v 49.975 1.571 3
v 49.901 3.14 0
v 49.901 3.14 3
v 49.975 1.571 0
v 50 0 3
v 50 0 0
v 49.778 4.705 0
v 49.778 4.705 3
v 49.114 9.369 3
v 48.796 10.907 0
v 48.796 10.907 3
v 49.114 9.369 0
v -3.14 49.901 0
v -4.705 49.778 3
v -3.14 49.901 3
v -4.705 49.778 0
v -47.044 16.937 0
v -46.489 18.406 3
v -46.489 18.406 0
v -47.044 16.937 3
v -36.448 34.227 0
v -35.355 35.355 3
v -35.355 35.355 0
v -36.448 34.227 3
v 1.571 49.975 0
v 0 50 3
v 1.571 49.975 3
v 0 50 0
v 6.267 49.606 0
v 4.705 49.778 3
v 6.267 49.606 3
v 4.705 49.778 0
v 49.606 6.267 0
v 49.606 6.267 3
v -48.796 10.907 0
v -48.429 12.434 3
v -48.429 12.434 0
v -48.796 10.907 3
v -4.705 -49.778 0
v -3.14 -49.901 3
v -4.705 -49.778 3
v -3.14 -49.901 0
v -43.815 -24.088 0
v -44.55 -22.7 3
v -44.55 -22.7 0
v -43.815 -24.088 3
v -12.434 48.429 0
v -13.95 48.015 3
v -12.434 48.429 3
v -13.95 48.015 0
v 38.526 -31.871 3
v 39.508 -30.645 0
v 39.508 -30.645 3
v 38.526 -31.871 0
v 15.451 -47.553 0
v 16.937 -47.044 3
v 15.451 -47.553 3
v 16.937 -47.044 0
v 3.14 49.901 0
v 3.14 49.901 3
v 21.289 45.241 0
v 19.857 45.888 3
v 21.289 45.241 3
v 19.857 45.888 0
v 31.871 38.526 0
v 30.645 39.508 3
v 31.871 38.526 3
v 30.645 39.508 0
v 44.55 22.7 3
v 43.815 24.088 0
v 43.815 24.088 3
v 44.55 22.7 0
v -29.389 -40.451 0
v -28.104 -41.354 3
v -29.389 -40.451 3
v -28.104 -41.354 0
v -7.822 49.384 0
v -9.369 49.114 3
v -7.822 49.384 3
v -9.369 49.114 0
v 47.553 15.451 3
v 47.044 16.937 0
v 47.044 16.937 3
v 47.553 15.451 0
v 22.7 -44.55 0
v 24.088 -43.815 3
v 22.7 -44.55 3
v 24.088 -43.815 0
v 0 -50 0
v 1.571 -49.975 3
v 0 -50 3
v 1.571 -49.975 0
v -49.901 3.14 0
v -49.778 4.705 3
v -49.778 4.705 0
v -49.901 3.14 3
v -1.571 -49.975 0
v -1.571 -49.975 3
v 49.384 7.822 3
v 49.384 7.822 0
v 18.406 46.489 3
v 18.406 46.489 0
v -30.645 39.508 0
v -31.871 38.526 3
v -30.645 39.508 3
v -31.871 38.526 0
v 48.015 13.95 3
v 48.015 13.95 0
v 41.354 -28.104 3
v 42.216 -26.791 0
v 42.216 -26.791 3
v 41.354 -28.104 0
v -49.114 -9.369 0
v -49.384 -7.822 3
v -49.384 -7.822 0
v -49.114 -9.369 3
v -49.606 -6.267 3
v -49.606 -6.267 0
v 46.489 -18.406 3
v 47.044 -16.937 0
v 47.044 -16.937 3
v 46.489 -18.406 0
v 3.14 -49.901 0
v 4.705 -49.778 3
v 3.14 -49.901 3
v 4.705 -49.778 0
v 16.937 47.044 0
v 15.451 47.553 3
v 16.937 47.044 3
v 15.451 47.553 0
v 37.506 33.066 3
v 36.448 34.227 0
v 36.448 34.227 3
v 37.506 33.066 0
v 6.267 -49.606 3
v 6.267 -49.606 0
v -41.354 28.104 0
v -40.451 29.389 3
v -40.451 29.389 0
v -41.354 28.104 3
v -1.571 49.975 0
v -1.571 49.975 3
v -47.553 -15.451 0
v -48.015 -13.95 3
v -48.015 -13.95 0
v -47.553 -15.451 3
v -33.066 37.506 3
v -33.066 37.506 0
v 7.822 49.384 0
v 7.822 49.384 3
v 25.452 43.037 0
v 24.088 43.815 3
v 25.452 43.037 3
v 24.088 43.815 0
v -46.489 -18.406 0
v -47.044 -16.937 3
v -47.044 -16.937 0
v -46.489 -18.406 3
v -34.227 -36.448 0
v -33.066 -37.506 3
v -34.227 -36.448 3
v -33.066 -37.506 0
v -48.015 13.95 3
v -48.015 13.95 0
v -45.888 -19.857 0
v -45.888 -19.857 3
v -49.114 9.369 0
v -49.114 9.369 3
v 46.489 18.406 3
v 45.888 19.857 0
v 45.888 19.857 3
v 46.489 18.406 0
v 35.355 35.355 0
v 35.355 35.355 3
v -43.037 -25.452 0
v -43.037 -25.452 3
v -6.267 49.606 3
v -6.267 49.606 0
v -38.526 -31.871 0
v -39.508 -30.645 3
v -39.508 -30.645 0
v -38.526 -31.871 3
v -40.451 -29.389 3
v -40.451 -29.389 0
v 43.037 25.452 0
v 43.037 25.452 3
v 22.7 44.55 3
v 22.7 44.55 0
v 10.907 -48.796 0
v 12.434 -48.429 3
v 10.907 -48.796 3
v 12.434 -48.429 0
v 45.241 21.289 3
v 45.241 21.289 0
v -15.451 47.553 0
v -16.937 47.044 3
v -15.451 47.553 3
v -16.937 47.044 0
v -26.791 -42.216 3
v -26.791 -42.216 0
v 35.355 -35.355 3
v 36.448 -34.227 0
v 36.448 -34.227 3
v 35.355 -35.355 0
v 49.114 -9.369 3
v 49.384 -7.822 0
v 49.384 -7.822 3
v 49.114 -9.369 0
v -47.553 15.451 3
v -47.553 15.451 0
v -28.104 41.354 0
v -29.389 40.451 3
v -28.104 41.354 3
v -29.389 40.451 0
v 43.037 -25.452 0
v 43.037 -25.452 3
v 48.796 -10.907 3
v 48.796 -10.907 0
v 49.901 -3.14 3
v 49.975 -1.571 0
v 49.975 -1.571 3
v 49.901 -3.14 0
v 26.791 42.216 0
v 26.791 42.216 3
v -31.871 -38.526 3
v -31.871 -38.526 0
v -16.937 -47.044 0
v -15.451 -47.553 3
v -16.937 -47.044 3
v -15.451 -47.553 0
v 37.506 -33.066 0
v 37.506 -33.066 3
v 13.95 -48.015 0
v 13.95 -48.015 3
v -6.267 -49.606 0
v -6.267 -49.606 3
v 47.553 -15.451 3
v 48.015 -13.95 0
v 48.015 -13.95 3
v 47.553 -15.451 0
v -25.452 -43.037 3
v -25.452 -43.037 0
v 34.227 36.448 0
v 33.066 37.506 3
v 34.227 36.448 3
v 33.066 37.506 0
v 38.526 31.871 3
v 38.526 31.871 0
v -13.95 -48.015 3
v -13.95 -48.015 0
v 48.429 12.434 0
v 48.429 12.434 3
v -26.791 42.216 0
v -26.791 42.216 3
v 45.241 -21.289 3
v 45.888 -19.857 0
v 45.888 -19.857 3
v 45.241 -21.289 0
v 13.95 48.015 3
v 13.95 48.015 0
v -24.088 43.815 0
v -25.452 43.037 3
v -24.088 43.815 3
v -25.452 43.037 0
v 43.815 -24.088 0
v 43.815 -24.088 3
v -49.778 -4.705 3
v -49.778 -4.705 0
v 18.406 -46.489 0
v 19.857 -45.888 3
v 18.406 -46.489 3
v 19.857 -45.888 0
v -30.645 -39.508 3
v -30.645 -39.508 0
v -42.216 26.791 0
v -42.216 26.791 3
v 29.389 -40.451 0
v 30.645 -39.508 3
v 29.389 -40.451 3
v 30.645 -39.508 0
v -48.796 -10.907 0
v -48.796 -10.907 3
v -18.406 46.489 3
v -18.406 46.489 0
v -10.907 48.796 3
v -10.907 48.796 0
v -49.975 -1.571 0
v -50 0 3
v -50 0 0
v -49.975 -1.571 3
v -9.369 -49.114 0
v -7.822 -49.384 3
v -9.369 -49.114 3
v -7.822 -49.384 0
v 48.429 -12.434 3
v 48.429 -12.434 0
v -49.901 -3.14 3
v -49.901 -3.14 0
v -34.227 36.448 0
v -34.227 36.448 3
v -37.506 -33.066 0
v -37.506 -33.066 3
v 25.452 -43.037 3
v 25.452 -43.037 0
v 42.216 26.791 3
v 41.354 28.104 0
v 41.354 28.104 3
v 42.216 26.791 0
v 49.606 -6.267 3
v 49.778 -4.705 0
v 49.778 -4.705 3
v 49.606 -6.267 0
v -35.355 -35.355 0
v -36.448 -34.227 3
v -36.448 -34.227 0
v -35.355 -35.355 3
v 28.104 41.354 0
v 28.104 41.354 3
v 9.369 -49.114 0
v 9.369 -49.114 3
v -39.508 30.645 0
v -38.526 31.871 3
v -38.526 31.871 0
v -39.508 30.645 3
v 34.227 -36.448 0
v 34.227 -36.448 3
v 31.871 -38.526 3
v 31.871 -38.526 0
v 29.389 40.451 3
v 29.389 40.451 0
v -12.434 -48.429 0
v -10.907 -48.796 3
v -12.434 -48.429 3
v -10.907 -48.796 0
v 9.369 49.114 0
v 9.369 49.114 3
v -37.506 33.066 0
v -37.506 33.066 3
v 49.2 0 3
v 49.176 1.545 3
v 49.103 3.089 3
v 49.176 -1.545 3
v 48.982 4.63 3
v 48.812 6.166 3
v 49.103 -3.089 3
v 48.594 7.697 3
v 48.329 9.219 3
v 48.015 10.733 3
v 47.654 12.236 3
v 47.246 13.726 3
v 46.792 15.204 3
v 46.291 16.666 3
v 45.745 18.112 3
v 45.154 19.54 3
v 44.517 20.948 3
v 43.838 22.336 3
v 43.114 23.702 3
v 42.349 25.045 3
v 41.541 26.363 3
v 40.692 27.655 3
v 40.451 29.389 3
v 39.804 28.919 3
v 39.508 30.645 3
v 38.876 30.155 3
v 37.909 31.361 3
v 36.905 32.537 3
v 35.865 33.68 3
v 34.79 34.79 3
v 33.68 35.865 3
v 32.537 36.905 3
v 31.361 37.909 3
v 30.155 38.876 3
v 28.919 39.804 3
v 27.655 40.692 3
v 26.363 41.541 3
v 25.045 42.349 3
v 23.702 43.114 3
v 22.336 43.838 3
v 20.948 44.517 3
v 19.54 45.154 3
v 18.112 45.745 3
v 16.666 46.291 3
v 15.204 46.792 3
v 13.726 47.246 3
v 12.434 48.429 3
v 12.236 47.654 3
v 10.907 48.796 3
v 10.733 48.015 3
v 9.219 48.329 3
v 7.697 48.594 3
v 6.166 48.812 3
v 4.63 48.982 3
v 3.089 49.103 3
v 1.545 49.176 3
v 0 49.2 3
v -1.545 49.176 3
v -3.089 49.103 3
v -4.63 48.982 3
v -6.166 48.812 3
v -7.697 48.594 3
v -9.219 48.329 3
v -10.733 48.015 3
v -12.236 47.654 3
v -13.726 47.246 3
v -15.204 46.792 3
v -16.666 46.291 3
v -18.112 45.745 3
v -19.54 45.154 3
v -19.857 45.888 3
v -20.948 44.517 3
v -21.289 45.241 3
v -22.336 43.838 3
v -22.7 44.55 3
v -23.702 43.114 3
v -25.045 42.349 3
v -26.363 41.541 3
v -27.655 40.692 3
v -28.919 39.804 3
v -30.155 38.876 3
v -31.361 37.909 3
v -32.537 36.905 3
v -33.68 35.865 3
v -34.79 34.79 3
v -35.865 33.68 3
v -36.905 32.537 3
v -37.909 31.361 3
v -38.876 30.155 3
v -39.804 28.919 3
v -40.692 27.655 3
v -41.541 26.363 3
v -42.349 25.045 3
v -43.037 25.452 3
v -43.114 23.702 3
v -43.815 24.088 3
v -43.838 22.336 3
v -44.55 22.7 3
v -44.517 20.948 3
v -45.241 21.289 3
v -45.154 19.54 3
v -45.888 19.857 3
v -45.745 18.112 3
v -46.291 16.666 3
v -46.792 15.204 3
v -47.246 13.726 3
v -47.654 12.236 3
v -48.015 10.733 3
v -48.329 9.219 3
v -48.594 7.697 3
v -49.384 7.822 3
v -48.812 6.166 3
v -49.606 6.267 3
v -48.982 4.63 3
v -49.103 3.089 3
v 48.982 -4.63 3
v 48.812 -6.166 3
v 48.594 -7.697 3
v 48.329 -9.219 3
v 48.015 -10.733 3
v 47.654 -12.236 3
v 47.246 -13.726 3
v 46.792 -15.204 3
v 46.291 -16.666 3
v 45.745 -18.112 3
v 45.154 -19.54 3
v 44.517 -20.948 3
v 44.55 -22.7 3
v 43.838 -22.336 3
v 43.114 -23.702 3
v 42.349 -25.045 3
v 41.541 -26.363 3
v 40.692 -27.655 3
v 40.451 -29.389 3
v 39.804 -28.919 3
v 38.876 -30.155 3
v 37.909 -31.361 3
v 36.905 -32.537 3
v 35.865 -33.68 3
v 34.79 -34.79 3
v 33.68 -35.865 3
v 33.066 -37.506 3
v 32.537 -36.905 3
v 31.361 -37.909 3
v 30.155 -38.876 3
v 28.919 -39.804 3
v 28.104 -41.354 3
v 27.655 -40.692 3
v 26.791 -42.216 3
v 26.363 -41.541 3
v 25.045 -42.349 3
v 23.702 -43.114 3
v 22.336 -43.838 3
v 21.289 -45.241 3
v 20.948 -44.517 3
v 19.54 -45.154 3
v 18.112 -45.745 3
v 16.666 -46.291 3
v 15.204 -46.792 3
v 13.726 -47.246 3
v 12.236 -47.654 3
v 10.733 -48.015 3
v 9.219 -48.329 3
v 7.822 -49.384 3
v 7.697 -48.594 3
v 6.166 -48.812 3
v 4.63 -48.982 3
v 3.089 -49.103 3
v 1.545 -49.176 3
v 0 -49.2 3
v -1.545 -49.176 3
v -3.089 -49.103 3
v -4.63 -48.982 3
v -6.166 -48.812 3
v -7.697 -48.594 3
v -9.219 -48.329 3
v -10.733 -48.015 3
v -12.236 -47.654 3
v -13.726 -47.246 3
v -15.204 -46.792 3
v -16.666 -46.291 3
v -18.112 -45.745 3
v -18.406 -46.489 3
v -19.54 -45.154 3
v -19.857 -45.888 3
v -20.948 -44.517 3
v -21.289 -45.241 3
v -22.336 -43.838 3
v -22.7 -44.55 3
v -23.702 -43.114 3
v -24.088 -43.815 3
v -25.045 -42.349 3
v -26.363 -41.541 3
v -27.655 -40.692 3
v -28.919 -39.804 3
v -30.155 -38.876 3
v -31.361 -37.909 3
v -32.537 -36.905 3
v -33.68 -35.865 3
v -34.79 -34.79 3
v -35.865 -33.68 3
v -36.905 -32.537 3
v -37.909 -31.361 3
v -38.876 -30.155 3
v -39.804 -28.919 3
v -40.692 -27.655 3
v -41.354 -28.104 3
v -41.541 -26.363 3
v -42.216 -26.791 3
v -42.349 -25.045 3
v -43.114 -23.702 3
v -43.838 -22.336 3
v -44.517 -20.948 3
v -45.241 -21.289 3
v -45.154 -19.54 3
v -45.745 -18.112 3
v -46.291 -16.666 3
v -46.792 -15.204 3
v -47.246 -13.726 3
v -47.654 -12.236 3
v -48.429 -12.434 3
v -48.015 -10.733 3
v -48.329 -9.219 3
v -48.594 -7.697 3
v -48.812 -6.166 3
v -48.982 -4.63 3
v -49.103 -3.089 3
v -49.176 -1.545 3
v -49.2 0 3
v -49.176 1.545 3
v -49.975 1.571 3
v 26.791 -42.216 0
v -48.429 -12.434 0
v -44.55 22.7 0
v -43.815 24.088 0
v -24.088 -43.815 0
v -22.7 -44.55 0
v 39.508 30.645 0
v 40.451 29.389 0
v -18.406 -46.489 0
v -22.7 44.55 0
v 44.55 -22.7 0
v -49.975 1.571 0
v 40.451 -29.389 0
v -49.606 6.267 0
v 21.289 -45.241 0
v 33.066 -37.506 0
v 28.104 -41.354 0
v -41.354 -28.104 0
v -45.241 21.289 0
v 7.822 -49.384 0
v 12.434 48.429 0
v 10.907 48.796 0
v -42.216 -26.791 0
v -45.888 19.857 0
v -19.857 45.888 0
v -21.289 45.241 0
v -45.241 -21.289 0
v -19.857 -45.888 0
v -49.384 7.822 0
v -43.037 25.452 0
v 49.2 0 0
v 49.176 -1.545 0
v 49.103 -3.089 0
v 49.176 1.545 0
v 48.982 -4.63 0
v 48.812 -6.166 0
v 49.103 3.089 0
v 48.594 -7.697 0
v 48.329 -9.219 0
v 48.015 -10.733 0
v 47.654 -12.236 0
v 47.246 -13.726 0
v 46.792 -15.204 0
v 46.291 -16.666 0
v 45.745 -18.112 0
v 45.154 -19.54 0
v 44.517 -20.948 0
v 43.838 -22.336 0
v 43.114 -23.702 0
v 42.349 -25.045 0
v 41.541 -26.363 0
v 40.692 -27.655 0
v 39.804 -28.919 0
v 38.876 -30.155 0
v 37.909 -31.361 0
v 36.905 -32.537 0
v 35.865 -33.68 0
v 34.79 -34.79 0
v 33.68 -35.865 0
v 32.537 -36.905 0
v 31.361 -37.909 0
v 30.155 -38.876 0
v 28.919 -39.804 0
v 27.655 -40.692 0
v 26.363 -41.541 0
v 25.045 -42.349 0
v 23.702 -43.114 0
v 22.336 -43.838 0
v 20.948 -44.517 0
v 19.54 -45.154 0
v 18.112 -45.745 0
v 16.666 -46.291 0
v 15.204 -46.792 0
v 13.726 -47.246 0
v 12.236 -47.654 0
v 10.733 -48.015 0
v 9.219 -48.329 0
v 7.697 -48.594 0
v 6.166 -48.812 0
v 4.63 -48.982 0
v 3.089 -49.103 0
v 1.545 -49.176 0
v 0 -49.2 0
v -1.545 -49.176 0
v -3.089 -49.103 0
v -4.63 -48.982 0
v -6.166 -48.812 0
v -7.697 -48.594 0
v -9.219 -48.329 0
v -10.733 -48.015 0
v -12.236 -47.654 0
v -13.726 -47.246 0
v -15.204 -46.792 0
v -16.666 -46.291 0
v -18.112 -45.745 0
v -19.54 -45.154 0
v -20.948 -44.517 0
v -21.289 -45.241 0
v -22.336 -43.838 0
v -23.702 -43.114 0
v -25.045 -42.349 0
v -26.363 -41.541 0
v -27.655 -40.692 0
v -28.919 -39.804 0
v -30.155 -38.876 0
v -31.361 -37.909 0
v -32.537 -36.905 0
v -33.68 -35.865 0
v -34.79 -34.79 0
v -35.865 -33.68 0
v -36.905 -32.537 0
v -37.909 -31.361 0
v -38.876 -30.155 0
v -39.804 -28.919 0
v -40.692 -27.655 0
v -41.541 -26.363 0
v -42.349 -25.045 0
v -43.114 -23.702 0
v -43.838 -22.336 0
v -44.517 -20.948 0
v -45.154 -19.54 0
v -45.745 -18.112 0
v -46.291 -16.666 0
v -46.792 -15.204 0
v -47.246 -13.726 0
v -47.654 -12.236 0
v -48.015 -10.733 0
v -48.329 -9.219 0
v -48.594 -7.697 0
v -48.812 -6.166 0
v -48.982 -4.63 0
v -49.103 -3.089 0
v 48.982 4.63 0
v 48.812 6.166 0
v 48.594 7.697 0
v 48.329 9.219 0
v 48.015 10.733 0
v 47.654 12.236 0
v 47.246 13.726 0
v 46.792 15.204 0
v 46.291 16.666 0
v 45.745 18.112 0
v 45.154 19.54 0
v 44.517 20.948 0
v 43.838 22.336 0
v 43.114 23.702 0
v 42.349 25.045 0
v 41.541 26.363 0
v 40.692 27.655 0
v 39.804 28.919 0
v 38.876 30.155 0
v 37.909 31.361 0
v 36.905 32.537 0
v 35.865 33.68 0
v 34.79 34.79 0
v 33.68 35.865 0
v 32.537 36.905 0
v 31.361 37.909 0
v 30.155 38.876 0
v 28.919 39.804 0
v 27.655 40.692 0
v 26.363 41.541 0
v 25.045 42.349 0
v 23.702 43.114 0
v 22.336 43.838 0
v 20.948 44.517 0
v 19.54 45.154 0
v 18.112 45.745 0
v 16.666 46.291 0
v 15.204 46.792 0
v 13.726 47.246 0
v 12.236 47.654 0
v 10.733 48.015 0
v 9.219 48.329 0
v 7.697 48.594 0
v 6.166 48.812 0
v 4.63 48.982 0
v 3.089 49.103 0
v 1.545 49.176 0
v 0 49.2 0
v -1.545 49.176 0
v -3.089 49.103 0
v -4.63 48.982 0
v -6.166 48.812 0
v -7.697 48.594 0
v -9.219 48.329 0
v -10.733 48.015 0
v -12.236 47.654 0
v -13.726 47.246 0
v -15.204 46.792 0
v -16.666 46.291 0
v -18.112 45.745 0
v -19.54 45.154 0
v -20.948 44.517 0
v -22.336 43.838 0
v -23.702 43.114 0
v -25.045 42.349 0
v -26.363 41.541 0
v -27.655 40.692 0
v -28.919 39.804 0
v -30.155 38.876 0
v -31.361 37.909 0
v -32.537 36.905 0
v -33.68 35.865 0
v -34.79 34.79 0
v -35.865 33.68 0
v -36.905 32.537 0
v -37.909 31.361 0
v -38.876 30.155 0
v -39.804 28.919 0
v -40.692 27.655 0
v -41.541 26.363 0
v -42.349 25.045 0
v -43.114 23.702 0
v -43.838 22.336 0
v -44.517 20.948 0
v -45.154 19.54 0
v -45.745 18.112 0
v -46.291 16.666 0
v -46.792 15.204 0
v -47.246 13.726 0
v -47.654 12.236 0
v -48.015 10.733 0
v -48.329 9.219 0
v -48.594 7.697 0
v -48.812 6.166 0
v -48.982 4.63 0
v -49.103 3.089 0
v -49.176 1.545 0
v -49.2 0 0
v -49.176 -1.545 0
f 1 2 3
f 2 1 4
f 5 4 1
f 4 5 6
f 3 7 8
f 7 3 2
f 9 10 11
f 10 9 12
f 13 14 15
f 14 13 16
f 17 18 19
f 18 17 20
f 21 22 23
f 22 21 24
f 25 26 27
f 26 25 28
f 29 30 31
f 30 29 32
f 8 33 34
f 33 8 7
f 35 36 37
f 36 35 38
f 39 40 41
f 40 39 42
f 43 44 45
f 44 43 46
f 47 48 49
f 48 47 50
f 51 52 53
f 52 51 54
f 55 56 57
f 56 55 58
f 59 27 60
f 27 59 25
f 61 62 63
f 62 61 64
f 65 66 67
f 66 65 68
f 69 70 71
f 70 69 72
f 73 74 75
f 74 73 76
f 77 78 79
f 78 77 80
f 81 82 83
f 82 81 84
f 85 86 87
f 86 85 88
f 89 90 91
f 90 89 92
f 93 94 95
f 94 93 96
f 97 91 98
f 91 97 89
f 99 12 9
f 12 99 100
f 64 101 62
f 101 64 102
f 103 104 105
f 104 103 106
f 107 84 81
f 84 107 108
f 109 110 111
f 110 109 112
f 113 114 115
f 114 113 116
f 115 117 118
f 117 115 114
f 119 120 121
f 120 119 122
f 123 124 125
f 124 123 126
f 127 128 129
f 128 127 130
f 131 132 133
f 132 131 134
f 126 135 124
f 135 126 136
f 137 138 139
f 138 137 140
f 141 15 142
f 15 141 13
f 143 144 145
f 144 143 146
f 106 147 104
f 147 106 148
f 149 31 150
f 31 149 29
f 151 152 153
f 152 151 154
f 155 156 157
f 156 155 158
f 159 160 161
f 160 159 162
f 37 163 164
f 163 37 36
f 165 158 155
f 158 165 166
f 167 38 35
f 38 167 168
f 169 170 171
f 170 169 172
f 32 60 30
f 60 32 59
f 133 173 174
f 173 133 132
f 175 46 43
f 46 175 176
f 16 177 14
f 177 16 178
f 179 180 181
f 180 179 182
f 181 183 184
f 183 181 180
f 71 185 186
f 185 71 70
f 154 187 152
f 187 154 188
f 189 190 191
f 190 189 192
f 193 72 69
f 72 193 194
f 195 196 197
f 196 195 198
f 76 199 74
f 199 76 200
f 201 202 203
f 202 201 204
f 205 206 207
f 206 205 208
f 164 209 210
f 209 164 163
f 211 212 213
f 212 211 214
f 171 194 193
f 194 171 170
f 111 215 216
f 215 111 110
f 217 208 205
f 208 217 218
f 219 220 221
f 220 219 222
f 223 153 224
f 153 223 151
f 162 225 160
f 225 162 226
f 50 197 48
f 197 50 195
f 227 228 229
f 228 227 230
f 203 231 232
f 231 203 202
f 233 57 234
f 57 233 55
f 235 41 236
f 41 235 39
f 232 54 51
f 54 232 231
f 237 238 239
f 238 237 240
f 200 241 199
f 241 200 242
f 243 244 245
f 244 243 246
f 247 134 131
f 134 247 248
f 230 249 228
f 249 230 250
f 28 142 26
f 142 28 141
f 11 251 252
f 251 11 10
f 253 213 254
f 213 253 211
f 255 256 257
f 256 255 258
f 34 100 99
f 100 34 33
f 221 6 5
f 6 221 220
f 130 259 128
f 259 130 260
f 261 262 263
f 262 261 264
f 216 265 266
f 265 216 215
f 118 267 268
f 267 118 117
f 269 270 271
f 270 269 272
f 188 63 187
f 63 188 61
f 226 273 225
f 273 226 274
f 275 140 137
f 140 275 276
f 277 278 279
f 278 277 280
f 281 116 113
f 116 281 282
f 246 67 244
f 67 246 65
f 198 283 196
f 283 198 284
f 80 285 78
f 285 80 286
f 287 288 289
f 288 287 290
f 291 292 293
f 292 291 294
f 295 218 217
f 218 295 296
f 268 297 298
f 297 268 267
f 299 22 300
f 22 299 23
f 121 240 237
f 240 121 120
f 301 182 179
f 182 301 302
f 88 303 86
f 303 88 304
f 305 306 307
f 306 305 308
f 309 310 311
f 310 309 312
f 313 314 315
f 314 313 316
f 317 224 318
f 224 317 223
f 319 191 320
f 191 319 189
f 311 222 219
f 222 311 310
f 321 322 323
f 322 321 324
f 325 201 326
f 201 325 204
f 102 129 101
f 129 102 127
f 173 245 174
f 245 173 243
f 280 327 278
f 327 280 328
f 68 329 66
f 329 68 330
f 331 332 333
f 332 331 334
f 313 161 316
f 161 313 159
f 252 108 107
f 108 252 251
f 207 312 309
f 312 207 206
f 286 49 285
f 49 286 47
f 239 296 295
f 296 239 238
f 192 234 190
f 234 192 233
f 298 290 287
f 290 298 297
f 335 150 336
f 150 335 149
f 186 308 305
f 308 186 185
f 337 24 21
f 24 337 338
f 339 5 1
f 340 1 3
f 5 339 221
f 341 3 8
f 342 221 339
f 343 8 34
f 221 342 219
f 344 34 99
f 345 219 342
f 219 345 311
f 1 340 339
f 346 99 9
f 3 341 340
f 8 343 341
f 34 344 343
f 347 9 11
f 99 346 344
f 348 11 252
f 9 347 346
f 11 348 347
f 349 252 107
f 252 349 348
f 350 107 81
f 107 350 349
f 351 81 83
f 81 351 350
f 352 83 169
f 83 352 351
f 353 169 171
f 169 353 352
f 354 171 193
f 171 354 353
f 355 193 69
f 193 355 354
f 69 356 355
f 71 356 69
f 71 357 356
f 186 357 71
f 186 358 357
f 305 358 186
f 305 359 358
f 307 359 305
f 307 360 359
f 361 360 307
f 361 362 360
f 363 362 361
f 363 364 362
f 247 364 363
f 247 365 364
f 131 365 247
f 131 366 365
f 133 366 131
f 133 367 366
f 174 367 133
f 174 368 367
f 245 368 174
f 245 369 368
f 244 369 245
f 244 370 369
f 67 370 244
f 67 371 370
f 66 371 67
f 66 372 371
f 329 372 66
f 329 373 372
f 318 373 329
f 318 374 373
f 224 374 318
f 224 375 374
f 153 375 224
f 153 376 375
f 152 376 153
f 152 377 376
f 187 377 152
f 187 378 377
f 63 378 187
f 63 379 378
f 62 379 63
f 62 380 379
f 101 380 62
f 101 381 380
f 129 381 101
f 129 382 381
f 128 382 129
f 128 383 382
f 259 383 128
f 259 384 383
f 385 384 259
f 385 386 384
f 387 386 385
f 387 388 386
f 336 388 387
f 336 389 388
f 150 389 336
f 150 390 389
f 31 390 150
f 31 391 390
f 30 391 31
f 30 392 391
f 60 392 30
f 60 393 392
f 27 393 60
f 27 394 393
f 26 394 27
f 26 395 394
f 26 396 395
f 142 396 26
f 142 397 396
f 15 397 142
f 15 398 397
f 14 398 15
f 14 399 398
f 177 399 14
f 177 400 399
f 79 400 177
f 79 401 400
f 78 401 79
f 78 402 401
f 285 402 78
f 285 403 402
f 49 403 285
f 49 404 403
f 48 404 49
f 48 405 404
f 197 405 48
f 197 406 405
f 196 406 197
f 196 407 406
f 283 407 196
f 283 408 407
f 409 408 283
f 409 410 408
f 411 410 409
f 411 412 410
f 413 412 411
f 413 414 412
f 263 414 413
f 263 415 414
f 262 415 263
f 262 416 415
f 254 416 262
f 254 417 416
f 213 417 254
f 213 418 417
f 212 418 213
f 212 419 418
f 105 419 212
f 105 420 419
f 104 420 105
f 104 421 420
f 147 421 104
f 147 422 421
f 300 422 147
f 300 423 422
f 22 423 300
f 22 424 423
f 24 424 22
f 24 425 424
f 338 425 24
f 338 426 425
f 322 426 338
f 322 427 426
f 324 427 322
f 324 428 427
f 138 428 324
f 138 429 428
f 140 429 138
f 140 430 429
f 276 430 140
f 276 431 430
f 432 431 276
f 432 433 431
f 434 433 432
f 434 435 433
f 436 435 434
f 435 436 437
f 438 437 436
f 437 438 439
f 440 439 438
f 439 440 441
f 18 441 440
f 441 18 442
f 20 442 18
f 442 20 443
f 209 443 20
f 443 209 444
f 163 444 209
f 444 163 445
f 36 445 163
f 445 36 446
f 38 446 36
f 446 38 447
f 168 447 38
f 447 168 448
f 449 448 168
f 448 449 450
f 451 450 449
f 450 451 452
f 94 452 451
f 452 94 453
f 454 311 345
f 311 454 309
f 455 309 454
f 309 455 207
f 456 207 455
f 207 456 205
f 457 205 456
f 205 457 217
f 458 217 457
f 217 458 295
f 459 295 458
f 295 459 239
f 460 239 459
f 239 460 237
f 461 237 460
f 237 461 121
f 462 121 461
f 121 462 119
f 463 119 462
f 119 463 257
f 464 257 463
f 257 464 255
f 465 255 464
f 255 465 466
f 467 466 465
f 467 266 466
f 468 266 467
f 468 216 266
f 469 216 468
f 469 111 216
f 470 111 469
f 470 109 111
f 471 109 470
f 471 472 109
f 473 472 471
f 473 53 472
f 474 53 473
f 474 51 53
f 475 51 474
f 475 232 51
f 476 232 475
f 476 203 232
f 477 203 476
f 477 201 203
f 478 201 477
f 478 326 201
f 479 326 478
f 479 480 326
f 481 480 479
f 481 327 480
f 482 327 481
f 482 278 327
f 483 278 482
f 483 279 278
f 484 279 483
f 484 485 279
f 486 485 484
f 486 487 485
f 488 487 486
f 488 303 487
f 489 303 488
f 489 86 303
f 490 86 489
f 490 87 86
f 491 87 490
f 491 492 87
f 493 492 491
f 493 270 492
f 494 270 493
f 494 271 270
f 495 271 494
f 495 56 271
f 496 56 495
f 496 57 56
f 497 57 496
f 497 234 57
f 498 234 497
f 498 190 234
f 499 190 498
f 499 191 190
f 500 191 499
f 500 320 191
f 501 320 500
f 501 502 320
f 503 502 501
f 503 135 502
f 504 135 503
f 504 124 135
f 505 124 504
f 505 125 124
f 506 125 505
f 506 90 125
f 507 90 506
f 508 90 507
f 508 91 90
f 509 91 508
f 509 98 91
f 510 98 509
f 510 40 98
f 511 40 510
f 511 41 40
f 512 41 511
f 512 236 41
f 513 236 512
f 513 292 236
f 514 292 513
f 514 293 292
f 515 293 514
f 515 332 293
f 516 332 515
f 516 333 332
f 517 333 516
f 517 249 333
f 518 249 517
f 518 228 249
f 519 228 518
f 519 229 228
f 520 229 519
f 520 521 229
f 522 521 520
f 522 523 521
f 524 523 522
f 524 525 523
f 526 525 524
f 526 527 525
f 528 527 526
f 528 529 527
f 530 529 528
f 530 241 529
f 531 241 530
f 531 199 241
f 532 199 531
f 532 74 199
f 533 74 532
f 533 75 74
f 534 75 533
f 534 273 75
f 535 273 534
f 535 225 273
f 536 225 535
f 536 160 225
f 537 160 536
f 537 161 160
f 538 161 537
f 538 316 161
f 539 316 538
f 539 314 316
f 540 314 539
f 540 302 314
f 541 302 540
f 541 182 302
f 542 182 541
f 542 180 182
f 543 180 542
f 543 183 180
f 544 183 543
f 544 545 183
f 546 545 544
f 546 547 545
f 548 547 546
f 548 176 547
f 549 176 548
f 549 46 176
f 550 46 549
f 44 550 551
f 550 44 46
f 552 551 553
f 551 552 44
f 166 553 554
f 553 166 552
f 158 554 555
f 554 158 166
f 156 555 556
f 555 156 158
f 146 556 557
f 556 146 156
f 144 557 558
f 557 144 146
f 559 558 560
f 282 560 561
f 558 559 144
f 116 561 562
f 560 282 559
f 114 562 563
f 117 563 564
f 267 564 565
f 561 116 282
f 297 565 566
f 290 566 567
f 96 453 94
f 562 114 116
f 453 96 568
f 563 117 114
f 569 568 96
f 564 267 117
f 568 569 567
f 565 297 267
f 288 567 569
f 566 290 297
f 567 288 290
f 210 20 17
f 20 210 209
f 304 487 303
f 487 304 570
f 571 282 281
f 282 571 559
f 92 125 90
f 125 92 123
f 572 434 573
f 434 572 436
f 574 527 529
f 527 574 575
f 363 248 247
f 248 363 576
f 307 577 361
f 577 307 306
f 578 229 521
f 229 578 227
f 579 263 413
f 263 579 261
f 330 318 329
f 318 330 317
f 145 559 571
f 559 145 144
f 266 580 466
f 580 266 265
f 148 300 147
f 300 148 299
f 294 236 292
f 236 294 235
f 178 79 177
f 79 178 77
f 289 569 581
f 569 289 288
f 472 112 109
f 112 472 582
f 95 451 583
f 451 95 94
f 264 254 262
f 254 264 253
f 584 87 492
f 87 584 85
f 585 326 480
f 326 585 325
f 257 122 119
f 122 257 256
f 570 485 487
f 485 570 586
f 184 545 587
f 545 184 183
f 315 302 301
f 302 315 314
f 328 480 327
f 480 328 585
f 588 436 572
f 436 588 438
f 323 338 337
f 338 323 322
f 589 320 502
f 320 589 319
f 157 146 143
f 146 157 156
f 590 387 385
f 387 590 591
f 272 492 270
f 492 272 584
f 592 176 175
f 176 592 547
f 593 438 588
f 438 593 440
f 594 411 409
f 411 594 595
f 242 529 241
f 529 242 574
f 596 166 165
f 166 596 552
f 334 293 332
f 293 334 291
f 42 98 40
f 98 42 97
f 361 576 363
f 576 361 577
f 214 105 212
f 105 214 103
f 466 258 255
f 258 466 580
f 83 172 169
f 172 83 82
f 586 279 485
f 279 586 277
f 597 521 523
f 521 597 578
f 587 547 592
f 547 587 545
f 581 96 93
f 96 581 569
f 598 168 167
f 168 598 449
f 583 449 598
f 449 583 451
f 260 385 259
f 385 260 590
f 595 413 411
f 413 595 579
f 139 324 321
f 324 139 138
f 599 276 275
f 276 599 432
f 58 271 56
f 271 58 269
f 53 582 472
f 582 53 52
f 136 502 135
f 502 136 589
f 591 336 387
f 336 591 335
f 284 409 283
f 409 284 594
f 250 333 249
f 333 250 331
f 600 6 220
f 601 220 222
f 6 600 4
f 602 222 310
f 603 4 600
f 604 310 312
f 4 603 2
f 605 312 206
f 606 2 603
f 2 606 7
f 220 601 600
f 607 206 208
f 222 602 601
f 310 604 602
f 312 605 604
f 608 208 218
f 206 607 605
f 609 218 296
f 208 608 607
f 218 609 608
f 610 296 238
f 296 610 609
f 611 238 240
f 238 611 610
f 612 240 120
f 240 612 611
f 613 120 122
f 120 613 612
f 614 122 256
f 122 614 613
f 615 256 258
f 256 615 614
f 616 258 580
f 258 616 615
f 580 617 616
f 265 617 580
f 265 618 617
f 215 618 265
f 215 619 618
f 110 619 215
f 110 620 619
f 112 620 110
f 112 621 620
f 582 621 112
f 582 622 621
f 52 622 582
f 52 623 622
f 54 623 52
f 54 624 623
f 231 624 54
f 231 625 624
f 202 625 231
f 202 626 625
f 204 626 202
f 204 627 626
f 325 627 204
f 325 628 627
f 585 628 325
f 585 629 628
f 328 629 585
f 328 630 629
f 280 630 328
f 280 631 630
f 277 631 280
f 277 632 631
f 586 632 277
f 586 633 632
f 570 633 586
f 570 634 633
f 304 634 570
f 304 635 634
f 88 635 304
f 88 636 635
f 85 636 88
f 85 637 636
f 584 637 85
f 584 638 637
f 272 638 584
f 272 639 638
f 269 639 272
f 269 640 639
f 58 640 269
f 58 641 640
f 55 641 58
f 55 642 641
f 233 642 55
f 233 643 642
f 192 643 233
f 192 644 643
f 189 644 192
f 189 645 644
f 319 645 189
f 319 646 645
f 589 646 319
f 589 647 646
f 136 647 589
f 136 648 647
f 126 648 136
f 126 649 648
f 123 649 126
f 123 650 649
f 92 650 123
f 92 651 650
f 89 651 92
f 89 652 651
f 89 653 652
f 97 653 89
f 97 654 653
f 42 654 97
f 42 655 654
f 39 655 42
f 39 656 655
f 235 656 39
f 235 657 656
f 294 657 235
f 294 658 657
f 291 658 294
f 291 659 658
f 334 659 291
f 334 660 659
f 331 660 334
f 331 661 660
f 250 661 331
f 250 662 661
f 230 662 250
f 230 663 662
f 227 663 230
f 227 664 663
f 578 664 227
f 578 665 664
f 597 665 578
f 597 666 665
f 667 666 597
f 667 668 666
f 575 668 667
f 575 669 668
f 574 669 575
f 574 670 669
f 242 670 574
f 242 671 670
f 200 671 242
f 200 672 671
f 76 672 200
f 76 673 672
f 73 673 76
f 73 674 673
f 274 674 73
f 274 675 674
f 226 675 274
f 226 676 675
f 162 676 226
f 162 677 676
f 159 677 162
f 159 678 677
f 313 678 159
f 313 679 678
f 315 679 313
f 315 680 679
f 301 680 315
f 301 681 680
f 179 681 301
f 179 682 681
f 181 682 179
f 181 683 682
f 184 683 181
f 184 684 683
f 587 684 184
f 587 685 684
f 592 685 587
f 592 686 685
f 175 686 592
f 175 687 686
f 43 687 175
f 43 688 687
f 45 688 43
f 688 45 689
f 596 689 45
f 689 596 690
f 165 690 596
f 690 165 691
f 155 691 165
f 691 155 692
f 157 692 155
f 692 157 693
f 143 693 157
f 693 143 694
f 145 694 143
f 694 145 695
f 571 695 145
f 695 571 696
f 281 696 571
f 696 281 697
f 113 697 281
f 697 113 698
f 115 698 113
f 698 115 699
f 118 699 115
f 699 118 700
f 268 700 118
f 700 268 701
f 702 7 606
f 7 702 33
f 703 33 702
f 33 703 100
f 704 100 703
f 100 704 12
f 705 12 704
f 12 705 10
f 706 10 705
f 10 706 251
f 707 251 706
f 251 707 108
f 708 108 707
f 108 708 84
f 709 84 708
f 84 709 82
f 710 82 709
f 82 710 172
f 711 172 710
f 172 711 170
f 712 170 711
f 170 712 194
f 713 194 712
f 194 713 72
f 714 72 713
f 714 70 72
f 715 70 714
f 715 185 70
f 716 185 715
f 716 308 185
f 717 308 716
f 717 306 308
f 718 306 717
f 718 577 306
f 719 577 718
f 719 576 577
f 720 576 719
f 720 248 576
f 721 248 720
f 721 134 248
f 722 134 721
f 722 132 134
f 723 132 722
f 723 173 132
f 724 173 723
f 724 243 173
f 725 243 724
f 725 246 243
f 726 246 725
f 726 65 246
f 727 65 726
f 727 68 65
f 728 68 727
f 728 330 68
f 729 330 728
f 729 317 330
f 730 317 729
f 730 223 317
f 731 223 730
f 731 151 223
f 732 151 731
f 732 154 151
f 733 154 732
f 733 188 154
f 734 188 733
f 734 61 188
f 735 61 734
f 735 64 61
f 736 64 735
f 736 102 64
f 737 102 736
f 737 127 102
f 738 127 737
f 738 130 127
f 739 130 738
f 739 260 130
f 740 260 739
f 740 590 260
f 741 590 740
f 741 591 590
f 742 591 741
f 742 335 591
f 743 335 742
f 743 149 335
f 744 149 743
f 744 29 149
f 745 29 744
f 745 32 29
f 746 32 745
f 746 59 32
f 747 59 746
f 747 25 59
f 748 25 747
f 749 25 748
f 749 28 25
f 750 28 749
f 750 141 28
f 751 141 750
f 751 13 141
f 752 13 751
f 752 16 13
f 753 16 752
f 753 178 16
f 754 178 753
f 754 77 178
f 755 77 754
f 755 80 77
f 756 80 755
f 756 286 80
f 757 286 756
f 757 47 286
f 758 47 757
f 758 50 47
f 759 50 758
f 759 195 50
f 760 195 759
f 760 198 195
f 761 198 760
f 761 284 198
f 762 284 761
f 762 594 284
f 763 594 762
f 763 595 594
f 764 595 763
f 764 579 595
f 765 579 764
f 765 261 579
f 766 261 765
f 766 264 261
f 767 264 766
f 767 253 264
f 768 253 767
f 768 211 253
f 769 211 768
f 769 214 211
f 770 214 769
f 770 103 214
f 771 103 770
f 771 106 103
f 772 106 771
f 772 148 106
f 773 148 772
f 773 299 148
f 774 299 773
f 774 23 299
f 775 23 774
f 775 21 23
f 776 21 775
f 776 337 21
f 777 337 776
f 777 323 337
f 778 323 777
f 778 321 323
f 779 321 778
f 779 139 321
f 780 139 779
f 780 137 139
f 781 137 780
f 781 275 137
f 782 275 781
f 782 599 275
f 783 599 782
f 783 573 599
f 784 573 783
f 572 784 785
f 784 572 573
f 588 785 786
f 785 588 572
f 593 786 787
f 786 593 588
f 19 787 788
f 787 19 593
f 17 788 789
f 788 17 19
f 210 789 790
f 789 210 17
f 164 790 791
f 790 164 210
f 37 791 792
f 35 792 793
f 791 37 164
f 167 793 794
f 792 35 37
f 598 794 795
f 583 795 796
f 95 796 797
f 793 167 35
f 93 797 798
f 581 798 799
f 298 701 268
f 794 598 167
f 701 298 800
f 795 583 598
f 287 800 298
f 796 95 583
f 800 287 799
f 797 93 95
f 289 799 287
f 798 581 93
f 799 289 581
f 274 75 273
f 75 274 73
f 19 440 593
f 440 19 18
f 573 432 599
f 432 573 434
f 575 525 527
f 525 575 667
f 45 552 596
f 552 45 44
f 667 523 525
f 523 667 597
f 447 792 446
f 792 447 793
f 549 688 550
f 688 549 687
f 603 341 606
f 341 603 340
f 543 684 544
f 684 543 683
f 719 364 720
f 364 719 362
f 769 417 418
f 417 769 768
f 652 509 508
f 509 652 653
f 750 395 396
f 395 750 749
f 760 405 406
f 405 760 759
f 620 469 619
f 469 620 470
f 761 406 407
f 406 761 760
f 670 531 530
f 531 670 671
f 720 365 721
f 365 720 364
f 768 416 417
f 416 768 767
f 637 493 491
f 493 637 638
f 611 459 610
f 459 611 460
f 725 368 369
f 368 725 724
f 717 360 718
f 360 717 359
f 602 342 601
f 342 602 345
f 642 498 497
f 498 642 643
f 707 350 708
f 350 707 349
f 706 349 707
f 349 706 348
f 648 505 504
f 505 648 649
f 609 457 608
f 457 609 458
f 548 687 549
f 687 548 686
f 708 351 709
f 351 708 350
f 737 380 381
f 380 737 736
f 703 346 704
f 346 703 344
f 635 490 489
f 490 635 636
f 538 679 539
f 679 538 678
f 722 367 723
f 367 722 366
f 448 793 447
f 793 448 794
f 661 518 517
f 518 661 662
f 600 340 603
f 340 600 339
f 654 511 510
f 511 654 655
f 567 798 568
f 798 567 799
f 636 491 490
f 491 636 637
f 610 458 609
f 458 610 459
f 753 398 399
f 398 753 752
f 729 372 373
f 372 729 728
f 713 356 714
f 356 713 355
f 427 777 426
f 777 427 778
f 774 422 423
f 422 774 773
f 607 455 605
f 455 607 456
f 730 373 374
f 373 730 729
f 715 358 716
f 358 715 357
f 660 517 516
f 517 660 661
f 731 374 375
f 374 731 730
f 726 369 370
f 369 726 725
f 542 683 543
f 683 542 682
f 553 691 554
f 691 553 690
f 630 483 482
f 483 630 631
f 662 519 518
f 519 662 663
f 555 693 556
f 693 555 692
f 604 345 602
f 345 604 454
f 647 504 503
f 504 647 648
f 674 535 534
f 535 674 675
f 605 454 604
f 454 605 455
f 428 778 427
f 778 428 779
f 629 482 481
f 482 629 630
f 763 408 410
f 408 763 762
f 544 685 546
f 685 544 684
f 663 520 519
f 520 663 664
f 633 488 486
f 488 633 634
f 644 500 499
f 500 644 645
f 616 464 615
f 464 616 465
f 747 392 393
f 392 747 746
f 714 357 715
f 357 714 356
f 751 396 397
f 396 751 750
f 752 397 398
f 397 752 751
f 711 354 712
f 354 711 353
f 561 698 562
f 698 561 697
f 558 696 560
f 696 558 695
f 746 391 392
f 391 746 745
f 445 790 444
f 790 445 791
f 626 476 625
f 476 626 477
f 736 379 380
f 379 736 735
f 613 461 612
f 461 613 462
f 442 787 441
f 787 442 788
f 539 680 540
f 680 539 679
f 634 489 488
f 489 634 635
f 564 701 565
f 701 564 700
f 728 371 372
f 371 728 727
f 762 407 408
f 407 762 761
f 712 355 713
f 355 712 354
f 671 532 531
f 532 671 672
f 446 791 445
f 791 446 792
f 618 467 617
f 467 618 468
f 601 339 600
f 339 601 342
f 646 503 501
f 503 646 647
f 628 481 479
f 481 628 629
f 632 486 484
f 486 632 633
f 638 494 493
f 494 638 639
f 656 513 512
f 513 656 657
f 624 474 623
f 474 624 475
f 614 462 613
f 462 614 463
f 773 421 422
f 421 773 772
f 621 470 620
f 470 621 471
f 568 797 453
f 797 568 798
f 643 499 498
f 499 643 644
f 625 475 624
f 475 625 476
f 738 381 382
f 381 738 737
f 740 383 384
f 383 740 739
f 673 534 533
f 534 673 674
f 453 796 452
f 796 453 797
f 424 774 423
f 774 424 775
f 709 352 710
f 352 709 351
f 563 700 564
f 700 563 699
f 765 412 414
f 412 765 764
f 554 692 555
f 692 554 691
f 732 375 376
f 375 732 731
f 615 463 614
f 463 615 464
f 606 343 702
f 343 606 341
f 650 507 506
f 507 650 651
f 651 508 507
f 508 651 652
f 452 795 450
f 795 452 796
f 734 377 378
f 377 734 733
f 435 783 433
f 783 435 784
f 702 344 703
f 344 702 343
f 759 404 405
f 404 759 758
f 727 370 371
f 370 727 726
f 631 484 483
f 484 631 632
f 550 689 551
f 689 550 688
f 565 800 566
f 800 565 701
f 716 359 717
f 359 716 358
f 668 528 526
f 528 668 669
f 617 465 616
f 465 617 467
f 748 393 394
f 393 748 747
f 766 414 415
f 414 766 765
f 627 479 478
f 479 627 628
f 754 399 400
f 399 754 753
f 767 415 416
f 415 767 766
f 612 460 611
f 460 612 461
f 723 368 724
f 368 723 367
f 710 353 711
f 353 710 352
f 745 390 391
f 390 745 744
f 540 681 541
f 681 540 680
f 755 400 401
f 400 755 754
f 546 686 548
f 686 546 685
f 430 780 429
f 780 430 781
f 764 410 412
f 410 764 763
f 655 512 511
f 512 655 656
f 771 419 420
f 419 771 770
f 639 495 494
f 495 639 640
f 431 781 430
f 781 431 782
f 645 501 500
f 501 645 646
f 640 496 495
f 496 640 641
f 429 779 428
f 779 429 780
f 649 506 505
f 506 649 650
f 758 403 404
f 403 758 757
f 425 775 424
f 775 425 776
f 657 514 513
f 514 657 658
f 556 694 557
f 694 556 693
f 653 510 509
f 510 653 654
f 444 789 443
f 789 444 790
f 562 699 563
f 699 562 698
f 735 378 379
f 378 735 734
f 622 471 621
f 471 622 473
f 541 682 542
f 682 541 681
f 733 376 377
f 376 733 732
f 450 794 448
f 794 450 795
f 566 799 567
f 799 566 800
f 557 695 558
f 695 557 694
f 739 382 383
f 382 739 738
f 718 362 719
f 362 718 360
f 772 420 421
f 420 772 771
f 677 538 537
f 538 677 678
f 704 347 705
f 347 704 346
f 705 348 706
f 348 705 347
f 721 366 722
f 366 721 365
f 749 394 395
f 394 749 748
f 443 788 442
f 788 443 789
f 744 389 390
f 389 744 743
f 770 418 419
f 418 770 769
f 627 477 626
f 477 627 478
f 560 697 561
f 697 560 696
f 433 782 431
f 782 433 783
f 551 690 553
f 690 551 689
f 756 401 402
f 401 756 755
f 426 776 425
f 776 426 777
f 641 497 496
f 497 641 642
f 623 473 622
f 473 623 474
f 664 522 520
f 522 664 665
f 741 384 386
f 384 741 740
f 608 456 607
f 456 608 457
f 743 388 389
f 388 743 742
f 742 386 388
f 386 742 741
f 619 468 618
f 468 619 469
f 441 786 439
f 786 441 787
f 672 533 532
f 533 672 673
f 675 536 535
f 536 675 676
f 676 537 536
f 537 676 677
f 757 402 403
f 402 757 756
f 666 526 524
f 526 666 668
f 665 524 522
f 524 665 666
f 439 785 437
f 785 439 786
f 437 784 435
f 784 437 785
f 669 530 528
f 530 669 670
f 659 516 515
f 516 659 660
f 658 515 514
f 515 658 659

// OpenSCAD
$fn=200;

s=100;
lw=0.8;

difference(){
    cylinder(d=s, h=3); 
 
    translate([0,0,-.1])
    cylinder(d=s-lw*2, h=6);
}    
